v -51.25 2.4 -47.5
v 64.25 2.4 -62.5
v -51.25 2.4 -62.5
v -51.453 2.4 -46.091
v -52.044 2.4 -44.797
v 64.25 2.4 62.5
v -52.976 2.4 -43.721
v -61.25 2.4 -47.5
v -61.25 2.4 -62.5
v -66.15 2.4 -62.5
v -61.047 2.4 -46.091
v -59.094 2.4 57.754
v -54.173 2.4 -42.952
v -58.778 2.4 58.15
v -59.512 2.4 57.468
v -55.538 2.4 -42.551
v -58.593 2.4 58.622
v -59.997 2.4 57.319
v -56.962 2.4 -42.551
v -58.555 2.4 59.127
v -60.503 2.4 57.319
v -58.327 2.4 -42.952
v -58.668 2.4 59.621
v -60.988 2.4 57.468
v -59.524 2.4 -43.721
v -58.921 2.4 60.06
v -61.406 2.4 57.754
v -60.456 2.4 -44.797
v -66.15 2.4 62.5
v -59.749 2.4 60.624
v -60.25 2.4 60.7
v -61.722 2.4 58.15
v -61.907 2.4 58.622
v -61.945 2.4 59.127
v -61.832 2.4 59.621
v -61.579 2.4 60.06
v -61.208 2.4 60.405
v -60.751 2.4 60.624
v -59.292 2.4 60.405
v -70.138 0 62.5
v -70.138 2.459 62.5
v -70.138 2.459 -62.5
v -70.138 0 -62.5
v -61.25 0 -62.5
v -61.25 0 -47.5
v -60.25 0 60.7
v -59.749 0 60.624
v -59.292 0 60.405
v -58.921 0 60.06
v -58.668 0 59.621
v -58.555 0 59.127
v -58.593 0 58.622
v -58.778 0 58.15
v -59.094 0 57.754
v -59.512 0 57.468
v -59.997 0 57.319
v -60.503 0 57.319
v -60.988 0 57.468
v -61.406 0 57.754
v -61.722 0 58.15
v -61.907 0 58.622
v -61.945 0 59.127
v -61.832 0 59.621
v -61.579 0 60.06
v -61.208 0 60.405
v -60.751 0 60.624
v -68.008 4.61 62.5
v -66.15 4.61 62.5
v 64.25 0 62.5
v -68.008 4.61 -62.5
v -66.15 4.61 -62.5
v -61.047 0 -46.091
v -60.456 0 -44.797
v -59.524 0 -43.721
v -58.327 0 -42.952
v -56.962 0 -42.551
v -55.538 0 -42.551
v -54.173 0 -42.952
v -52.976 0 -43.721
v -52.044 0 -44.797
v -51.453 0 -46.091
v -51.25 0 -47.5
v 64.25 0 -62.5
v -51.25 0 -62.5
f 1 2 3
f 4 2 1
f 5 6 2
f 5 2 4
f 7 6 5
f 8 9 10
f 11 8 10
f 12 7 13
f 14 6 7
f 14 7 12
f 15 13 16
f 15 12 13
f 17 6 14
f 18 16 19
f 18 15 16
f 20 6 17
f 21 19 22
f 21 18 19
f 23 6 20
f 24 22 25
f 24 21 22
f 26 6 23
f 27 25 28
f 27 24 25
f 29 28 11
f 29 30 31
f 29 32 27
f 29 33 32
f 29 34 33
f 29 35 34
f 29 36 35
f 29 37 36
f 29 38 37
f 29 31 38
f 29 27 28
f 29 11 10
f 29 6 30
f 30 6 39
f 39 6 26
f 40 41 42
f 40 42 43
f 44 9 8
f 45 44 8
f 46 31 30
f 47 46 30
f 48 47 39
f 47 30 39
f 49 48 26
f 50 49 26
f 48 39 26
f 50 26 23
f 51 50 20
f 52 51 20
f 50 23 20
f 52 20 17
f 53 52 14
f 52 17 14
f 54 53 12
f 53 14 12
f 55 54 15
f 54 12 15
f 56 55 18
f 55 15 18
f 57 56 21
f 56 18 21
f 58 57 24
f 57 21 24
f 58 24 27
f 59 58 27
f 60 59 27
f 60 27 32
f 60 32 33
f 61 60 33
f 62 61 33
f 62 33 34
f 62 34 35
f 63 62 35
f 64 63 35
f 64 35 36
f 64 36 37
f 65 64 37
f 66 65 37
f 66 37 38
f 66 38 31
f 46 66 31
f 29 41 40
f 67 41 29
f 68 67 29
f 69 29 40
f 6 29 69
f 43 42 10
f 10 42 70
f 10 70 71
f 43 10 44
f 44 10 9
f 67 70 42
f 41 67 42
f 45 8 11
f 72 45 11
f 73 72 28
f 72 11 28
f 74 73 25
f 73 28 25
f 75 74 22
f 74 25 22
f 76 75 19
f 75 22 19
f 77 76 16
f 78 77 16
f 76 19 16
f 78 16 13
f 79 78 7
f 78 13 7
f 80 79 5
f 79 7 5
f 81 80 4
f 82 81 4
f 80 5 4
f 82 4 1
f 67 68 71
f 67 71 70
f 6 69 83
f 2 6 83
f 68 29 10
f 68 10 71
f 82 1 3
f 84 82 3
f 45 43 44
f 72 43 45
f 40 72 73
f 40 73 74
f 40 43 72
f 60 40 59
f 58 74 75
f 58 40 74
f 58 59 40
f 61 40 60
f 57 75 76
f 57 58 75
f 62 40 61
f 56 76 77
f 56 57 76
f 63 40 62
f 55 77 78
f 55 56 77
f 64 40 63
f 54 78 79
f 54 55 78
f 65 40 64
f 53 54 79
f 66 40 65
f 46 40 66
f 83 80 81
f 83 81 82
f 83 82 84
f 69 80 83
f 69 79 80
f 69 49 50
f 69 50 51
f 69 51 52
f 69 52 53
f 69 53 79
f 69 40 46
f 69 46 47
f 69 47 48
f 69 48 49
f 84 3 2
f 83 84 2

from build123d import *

# Parameters (mm, degrees)
SKETCH1_W           = 128.5
SKETCH1_H           = 125
BOSS_EXTRUDE1_DEPTH = 2.4
BOSS_EXTRUDE2_DEPTH = 125
CUT_EXTRUDE2_DEPTH  = 94.975369496
SKETCH6_R           = 1.7
CUT_EXTRUDE3_DEPTH  = 94.975369496


with BuildPart() as part:
    # Sketch1 → Boss-Extrude1 (new body)
    with BuildSketch(Plane(origin=(0, 0, 0), x_dir=(1, 0, 0), z_dir=(0, 1, 0))):
        Rectangle(SKETCH1_W, SKETCH1_H)
    extrude(amount=BOSS_EXTRUDE1_DEPTH)

    # Sketch3 → Boss-Extrude2 (add)
    with BuildSketch(Plane.XY.offset(62.5)):
        Polygon((-64.25, 2.4), (-66.05, 2.4), (-66.15, 2.4), (-66.15, 4.61), (-68.008287326, 4.61), (-70.138149903, 2.458869363), (-70.138149903, 0), (-64.25, 0), align=None)
    extrude(amount=-BOSS_EXTRUDE2_DEPTH)

    # Sketch5 → Cut-Extrude2 (cut, through all)
    with BuildSketch(Plane(origin=(0, 2.4, 0), x_dir=(1, 0, 0), z_dir=(0, 1, 0))):
        with BuildLine():
            Line((-51.25, 47.5), (-51.25, 62.5))
            Line((-51.25, 62.5), (-61.25, 62.5))
            Line((-61.25, 62.5), (-61.25, 47.5))
            ThreePointArc((-61.25, 47.5), (-56.25, 42.5), (-51.25, 47.5))
        make_face()
        with BuildLine():
            Line((-61.25, 62.5), (-51.25, 62.5))
            ThreePointArc((-51.25, 62.5), (-56.25, 67.5), (-61.25, 62.5))
        make_face()
    extrude(amount=-CUT_EXTRUDE2_DEPTH, mode=Mode.SUBTRACT)

    # Sketch6 → Cut-Extrude3 (cut, through all)
    with BuildSketch(Plane(origin=(0, 2.4, 0), x_dir=(1, 0, 0), z_dir=(0, 1, 0))):
        with Locations(Location((-60.25, -59, 0), (0, 0, 270))):
            Circle(SKETCH6_R)
    extrude(amount=-CUT_EXTRUDE3_DEPTH, mode=Mode.SUBTRACT)


solid = part.part
